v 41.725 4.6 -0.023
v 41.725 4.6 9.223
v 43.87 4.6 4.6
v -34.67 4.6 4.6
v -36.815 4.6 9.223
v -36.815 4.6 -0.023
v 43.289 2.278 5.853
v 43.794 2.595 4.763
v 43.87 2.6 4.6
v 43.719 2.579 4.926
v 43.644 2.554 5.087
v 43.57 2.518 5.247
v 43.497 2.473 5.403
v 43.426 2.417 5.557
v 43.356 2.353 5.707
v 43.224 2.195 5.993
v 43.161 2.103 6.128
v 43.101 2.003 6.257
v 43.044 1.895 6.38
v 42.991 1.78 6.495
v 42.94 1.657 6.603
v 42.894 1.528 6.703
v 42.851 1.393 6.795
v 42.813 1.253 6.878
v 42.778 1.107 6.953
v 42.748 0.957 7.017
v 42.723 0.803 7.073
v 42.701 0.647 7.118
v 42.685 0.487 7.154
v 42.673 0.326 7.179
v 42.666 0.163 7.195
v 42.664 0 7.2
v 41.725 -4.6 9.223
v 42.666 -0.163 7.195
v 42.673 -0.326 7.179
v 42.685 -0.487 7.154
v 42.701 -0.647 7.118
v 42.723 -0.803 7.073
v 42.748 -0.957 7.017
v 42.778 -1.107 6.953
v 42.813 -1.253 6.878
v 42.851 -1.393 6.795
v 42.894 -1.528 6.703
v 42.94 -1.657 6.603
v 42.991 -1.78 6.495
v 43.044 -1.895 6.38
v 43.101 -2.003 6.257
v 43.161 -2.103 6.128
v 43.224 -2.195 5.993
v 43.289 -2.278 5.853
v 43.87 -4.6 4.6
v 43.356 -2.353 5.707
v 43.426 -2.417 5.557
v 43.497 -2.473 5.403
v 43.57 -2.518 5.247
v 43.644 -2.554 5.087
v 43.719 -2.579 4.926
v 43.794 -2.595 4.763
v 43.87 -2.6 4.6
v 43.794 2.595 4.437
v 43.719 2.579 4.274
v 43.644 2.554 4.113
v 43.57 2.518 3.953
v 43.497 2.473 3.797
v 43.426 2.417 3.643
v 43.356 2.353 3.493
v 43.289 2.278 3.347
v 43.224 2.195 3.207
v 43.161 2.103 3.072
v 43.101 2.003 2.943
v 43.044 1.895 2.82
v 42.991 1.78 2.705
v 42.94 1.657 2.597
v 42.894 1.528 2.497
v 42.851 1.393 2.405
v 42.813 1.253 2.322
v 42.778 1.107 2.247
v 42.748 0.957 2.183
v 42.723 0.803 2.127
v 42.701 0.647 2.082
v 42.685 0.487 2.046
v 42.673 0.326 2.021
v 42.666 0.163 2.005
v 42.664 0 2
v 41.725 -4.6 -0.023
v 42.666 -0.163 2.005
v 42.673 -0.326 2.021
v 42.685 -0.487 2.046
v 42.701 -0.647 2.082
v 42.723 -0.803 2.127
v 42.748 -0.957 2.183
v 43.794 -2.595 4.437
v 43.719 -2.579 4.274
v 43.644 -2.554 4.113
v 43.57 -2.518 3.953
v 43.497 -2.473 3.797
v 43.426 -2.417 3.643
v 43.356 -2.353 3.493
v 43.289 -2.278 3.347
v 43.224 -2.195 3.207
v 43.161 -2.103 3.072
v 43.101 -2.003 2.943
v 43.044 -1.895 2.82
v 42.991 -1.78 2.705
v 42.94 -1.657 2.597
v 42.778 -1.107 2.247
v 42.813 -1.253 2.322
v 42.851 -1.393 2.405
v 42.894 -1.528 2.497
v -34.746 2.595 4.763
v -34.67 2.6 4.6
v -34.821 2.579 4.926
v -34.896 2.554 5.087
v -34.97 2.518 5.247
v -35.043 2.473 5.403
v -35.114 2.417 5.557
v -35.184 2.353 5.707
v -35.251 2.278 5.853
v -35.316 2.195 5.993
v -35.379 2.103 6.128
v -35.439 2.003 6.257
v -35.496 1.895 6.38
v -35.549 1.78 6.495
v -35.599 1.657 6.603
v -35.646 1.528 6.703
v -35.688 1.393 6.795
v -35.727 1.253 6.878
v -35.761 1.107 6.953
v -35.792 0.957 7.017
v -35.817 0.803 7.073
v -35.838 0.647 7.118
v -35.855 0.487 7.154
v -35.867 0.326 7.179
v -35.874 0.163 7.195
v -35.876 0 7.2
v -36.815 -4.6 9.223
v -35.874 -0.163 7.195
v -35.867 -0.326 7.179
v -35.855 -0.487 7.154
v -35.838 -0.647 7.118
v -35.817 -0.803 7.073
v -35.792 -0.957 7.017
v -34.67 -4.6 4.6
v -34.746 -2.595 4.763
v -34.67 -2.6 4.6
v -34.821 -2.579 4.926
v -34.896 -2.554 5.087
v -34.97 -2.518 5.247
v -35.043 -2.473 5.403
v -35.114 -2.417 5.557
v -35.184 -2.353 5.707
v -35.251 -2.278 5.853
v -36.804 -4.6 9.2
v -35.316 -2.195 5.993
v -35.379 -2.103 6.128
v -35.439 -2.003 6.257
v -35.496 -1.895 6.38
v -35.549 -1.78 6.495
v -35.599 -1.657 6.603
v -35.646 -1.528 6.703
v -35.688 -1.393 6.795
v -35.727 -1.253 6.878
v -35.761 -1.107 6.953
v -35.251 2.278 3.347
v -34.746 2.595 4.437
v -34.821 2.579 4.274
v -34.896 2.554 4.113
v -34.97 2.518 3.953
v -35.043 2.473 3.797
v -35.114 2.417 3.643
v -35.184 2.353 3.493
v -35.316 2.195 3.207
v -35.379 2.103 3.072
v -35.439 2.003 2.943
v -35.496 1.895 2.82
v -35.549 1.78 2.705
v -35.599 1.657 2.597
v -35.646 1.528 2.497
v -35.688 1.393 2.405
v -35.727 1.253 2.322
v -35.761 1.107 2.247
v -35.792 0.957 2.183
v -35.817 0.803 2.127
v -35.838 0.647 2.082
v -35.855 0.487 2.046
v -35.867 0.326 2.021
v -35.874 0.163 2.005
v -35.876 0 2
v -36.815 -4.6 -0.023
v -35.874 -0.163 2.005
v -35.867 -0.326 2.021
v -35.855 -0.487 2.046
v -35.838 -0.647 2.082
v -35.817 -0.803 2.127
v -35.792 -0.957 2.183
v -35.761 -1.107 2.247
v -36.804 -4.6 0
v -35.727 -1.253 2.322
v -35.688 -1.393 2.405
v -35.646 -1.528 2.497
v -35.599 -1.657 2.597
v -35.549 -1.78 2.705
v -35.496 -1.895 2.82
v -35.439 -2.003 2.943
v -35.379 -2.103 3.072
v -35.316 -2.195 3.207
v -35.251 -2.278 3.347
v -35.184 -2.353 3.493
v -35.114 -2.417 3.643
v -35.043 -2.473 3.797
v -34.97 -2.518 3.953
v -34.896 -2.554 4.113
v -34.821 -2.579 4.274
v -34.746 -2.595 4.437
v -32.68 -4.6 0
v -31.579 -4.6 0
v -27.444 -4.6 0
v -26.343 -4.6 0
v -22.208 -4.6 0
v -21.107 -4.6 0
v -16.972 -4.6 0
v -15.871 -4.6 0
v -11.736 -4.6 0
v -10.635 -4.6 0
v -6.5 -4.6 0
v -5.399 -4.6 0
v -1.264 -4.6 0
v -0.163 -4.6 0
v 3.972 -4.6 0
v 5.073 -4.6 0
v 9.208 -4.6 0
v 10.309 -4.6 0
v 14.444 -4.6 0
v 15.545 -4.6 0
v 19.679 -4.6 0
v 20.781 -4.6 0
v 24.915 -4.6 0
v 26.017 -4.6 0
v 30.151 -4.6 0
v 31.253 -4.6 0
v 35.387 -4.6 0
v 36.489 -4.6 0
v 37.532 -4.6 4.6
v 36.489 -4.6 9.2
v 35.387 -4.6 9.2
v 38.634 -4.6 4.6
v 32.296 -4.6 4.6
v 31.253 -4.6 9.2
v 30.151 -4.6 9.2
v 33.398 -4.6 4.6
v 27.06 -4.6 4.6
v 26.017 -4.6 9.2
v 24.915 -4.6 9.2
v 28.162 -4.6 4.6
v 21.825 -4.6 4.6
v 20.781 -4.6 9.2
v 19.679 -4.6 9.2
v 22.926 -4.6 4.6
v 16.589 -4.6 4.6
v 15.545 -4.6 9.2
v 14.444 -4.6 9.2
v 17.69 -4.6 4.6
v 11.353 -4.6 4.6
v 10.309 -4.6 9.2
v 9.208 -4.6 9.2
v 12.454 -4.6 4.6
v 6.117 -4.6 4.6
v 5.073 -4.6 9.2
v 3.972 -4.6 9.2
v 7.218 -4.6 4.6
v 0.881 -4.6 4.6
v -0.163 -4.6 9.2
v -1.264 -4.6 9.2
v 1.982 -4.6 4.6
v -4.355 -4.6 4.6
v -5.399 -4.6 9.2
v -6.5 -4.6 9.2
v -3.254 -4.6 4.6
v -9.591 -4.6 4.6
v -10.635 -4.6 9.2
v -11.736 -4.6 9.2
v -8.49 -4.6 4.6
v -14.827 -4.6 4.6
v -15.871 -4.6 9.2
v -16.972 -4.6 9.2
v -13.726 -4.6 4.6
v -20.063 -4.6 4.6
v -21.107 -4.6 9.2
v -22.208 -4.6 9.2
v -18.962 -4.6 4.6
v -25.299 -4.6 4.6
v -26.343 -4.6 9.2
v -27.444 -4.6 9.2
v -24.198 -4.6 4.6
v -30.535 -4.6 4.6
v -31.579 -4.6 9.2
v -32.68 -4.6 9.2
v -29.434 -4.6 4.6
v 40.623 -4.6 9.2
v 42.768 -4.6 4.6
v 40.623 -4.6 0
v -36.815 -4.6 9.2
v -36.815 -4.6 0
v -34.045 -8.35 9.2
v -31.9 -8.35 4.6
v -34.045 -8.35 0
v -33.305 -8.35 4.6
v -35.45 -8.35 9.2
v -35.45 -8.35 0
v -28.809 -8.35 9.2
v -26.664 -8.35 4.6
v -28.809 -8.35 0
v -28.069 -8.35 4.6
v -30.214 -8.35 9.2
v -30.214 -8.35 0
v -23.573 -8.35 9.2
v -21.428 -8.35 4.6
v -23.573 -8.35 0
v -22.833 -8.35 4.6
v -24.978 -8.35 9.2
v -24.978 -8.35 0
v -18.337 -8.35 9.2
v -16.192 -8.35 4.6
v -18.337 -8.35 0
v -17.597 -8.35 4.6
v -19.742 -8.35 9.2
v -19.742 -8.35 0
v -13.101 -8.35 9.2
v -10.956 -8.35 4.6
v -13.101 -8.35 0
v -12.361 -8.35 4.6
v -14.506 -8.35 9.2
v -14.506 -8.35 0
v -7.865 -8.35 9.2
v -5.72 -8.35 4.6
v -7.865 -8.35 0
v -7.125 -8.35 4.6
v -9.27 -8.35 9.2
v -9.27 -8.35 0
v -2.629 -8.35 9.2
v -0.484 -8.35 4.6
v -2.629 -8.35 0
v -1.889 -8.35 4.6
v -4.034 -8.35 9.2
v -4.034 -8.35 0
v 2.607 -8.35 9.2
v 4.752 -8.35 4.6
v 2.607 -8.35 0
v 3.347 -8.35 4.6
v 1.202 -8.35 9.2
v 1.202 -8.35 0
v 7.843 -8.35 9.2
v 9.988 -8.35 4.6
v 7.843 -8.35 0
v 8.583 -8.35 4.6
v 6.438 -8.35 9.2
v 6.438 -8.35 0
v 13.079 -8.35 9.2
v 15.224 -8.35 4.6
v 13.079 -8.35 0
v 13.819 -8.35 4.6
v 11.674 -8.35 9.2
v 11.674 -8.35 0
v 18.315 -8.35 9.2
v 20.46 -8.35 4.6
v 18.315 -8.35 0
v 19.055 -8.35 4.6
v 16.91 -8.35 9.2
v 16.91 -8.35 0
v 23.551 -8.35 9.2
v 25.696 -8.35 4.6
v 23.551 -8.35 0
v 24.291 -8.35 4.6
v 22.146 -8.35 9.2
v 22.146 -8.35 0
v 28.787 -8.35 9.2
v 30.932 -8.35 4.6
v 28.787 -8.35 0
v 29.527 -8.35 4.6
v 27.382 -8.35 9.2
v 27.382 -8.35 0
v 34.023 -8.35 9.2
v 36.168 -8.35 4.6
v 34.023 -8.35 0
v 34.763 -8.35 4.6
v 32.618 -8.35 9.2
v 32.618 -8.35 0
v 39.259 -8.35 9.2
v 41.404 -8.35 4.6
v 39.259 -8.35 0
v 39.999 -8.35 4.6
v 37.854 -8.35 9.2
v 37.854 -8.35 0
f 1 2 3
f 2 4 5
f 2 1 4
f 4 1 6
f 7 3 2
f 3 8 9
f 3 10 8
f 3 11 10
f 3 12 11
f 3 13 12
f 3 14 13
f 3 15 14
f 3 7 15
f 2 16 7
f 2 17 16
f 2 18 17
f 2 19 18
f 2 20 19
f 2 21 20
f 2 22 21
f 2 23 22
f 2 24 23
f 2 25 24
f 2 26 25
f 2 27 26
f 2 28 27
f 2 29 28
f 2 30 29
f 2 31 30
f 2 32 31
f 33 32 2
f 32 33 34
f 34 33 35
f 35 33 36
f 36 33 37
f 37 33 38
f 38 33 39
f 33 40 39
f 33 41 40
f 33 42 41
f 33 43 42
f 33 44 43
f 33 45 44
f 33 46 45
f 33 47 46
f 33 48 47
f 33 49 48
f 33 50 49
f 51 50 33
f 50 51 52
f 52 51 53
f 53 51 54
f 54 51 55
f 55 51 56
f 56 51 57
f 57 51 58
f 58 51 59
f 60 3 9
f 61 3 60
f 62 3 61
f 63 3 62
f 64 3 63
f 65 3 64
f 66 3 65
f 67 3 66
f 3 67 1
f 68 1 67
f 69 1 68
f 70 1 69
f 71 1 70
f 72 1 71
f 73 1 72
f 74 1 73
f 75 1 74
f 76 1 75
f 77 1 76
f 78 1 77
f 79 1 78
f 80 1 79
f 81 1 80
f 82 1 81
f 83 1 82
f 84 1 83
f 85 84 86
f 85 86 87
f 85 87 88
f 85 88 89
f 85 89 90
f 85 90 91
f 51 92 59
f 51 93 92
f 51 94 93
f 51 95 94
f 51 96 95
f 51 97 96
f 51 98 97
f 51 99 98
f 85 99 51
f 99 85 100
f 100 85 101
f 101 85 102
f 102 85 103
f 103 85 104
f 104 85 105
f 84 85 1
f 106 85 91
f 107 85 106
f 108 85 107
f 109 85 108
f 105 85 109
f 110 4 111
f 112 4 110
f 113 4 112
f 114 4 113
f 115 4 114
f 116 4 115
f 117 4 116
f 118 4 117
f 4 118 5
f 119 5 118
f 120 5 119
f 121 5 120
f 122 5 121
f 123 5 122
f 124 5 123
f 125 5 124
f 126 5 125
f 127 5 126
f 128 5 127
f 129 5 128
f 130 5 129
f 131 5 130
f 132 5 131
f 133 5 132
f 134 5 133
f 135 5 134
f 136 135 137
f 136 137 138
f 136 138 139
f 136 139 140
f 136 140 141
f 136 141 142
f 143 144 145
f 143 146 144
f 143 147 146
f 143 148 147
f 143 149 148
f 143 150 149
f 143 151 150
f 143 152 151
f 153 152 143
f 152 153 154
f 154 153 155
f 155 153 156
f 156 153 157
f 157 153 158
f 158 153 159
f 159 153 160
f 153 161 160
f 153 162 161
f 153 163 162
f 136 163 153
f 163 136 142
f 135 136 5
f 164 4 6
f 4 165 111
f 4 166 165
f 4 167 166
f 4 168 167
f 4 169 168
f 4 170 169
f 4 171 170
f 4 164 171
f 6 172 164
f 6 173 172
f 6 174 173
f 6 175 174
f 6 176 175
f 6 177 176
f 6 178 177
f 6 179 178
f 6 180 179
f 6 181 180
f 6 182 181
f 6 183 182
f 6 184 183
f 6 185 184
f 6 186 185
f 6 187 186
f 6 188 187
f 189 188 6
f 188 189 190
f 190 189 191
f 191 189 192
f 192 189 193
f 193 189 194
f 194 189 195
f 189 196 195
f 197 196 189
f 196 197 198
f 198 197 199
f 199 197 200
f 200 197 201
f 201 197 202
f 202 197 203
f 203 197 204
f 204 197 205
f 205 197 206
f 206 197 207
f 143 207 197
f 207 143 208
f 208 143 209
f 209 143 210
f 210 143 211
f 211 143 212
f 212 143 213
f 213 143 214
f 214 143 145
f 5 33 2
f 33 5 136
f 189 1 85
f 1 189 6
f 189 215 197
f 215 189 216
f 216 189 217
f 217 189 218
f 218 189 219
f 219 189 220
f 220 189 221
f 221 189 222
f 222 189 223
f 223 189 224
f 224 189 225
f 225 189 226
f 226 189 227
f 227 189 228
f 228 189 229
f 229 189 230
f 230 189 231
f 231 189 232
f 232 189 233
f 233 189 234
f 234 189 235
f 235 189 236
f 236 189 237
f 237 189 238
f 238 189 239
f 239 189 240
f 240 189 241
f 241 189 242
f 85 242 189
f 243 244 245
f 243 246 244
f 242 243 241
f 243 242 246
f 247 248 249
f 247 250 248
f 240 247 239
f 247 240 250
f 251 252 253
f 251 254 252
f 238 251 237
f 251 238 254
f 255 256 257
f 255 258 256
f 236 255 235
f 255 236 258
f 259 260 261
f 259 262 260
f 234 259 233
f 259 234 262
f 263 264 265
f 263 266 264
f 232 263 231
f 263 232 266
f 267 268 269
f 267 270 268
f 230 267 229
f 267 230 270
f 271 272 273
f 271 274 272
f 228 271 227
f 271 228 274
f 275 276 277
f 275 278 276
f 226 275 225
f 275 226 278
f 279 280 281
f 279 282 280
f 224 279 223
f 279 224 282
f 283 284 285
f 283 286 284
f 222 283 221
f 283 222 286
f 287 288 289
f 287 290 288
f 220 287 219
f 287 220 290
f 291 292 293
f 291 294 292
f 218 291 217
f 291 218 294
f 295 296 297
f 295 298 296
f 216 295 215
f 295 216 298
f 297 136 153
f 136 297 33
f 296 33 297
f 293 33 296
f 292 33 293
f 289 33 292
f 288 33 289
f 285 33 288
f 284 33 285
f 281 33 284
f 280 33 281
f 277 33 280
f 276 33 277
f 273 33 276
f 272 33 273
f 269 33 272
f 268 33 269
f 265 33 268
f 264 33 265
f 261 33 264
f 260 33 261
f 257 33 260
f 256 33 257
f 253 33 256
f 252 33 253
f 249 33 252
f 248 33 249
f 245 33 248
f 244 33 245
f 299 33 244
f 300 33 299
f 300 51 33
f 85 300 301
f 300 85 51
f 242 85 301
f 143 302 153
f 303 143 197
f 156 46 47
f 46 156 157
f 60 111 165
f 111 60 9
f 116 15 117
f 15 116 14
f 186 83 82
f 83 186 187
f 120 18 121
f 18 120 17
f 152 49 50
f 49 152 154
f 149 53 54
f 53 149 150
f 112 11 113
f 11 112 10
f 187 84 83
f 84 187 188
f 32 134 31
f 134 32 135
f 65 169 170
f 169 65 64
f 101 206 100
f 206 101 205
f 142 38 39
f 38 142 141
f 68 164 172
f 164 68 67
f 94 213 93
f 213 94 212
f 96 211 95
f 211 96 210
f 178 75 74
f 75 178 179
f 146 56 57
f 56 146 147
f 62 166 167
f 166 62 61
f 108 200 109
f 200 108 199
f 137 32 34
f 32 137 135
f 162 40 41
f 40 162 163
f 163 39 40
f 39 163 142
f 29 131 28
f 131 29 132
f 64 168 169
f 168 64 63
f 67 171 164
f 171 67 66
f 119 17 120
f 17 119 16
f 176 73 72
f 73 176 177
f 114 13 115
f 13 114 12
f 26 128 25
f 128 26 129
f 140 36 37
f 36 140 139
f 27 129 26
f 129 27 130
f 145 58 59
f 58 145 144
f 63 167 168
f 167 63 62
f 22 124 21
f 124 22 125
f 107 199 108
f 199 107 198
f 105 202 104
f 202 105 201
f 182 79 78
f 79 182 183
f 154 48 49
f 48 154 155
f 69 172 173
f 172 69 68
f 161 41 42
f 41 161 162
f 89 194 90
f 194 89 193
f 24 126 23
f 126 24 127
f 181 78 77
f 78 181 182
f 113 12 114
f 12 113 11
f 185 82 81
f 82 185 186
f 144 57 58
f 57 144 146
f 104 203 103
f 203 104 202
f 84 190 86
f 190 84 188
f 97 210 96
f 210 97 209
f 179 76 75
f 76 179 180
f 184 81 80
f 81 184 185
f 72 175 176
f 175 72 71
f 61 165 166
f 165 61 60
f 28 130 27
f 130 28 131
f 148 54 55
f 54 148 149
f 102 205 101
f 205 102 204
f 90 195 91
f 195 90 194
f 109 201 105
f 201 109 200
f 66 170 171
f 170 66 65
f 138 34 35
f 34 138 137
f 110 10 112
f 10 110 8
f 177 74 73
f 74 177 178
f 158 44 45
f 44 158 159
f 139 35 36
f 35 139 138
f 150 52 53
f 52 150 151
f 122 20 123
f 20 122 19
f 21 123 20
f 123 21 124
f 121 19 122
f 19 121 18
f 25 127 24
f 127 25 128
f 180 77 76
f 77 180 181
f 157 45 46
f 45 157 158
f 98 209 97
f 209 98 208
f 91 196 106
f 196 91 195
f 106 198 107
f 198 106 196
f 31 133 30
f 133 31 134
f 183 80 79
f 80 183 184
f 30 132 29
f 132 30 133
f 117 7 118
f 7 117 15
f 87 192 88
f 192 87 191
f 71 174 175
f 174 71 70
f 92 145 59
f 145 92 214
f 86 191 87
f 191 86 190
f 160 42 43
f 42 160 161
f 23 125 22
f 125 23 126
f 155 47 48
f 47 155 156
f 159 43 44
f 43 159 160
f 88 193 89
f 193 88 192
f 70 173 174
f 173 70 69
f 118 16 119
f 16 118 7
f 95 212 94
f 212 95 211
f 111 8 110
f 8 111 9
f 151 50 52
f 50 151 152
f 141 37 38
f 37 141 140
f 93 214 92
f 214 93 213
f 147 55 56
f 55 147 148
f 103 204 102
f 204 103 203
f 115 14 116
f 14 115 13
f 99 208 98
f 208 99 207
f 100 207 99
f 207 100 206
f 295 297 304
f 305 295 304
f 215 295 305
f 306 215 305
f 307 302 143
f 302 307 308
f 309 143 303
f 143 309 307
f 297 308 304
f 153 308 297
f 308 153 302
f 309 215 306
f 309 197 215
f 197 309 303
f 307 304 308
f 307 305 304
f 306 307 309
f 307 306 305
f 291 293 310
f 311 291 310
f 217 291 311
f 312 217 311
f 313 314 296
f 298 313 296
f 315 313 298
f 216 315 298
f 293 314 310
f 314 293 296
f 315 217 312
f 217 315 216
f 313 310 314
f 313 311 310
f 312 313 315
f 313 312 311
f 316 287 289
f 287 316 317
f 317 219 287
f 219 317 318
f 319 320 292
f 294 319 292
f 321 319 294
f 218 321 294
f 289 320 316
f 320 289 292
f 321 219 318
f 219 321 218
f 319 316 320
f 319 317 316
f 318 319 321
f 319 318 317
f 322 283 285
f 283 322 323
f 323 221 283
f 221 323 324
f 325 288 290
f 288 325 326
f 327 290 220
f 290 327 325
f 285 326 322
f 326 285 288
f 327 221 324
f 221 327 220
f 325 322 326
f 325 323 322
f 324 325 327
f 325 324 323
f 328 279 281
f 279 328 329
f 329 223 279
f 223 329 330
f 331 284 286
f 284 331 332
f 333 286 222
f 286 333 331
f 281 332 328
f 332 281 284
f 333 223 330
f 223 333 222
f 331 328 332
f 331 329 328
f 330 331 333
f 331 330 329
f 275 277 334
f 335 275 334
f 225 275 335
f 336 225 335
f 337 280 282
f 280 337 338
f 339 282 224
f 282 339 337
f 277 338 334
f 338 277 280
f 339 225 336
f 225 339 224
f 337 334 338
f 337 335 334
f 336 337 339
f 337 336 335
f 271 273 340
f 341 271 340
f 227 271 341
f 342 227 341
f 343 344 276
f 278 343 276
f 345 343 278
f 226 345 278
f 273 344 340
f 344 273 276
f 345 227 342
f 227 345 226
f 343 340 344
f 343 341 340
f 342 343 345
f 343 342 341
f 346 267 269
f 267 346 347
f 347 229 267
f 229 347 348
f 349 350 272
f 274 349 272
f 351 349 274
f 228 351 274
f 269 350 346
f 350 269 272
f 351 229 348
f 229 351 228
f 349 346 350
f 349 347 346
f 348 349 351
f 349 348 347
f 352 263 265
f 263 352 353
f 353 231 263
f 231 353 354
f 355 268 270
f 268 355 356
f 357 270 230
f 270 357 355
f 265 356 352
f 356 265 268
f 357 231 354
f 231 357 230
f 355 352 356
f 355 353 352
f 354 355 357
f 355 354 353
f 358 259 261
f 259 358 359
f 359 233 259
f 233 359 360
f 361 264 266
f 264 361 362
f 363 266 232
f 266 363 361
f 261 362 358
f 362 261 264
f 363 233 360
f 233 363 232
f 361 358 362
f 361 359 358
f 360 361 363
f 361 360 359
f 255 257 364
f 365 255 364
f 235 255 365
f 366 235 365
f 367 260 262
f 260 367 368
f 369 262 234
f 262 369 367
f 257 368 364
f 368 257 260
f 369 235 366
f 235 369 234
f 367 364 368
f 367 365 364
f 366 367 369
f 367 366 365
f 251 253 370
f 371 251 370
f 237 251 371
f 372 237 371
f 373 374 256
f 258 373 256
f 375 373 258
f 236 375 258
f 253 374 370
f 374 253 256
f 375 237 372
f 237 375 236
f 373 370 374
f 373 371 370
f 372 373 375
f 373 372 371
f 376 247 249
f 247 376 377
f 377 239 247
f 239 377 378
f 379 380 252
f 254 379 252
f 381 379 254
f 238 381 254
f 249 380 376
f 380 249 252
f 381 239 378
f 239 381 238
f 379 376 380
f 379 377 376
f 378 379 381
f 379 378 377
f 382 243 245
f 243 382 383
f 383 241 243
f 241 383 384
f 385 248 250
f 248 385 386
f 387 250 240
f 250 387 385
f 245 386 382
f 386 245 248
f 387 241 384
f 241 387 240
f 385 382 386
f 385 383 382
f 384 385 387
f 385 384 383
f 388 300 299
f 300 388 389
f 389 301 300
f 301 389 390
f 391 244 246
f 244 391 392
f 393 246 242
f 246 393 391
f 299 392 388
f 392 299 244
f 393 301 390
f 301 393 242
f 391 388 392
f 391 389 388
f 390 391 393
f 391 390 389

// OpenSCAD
// Parametric Modular Rack Mark "Ckaos" Moissette
//Based on the work of MattMoses and Fdavies :
//http://forums.reprap.org/read.php?1,51452,52099#msg-52099
//and Forrest Higgs:
// http://technocraticanarchist.blogspot.com/2010/01/high-speed-alternative-to-belts.html
//It is licensed under the Creative Commons - GNU GPL license.
// © 2011 by Mark "Ckaos" Moissette
//more info at :www.kaosat.net and
//http://www.thingiverse.com/thing:6011



pi=3.1415926535897932384626433832795;
innerRadius=2.6;//shaft radius, in mm
borders=2;//how thick should the borders around the central "shaft" be, in mm
diametralPitch=12;
numberOfTeeth=15;
pressureAngle=20*pi/180;
centerAngle=25;//angle at center of teeth


//example usage
rack(innerRadius,borders,diametralPitch,numberOfTeeth,pressureAngle,centerAngle);



module rack(innerRadius,borders,P,N,PA,CA)
{
	// P = diametral pitch
	// N = number of teeth
	// PA = pressure angle in radians
	// x, y = linear offset distances
	a = 1/P; // addendum (also known as "module")
	d = 1.25/P; // dedendum (this is set by a standard)
	multiplier=20;//20
	height=(d+a)*multiplier;
	
	
	// find the tangent of pressure angle once
	tanPA = tan(PA*(180/pi));
	// length of bottom and top horizontal segments of tooth profile
	botL = (pi/P/2 - 2*d*tanPA)*multiplier;
	topL =( pi/P/2 - 2*a*tanPA)*multiplier;

	slantLng=tanPA*height;
	realBase=2*slantLng+topL;
	
	
	offset=topL+botL+2*slantLng;
	length=(realBase+botL)*N;

	supportSize=(innerRadius+borders)*2;

	//calculate tooth params
	basesegmentL=realBase/2;
	basesegmentW=supportSize/2;

	topsegmentL=topL/2;
	topsegmentW=supportSize/2;

	baseoffsetY=tan(CA)*basesegmentW;
	topoffsetY=tan(CA)*topsegmentW;
	
	//calculate support params

	totalSupportLength=(N)*(offset);
	supportL=totalSupportLength/2;
	supportW=supportSize/1.99;
	
	echo("Total length",totalSupportLength+baseoffsetY);
	echo("Total height",supportSize);

	
	rotate([90,90,0])
	{
	translate([-supportSize/2,supportSize/2,0])
	{
	union()
	{
		difference()
		{
			support(supportL,supportW,supportSize,baseoffsetY);
			rotate([90,90,0]) 
			{cylinder(h=length+10,r=innerRadius,center=true,$fn=100);}
		}

	
		for (i = [0:N-1]) 
		{
			translate([0,i*offset-length/2+realBase/2,supportSize/2+height/2]) 
			{	
				
				tooth(basesegmentL,basesegmentW,topsegmentL,topsegmentW,height,baseoffsetY,topoffsetY);
				
			}
		}
	}
	
	}
	}
}

module support(supportL,supportW,height,offsetY)
{
	 tooth(supportL,supportW,supportL,supportW,height,offsetY,offsetY);
}



module tooth(basesegmentL,basesegmentW,topsegmentL,topsegmentW,height,baseoffsetY,topoffsetY)//top : width*length, same for base
{
	
	////////////////
	basePT1=[
	-basesegmentW,
	basesegmentL-baseoffsetY,
	-height/2];

	basePT2=[
	0,
	basesegmentL,
	-height/2];

	basePT3=[
	basesegmentW,
	basesegmentL-baseoffsetY,
	-height/2];

	basePT4=[
	basesegmentW,
	basesegmentL-(baseoffsetY+basesegmentL*2),
	-height/2];
	
	basePT5=[
	0,
	-basesegmentL,
	-height/2];

	basePT6=[
	-basesegmentW,
	basesegmentL-(baseoffsetY+basesegmentL*2),
	-height/2];
	//////////////////////////
	topPT1=[
	-topsegmentW,
	topsegmentL-topoffsetY,
	height/2];

	topPT2=[
	0,
	topsegmentL,
	height/2];

	topPT3=[
	topsegmentW,
	topsegmentL-topoffsetY,
	height/2];

	topPT4=[
	topsegmentW,
	topsegmentL-(topoffsetY+topsegmentL*2),
	height/2];
	
	topPT5=[
	0,
	-topsegmentL,
	height/2];

	topPT6=[
	-topsegmentW,
	topsegmentL-(topoffsetY+topsegmentL*2),
	height/2];
	//////////////////////////

	//////////////////////////

	polyhedron(
	points=[
		basePT1,
		basePT2,
		basePT3,
		basePT4,
		basePT5,
		basePT6,
		topPT1,
		topPT2,
		topPT3,
		topPT4,
		topPT5,
		topPT6],
	triangles=[
	//base
	[5,1,0],
	[4,1,5],
	[4,2,1],
	[3,2,4],	

	//front
	[1,6,0],
	[7,6,1],
	[2,7,1],
	[8,7,2],
	//back
	[11,10,5],
	[5,10,4],
	[10,9,4],
	[4,9,3],	
	//side 1
	[0,11,5],
	[6,11,0],
	//side 2
	[3,8,2],
	[9,8,3],
	//top
	[9,10,8],
	[10,7,8],
	[11,7,10],
	[6,7,11],
	]
	);
}

module demo_gear(position,diametralPitch)
{
	wheelSize=12;
rotate([0,90,180])
translate(position)

{
gear (
	number_of_teeth=8,
	circular_pitch=300, 
	pressure_angle=19.34,
	gear_thickness=wheelSize/2,
	rim_thickness=wheelSize/2,
	hub_thickness=0,
	bore_diameter=2,
	backlash=0,twist=centerAngle,involute_facets=15);

translate([0,0,wheelSize/2])
rotate([0,0,-centerAngle])
gear (
	number_of_teeth=8,
	circular_pitch=300, 
	pressure_angle=19.34,
	gear_thickness=wheelSize/2,
	rim_thickness=wheelSize/2,
	hub_thickness=0,
	bore_diameter=2,
	backlash=0,twist=-centerAngle,involute_facets=15);

}

}
